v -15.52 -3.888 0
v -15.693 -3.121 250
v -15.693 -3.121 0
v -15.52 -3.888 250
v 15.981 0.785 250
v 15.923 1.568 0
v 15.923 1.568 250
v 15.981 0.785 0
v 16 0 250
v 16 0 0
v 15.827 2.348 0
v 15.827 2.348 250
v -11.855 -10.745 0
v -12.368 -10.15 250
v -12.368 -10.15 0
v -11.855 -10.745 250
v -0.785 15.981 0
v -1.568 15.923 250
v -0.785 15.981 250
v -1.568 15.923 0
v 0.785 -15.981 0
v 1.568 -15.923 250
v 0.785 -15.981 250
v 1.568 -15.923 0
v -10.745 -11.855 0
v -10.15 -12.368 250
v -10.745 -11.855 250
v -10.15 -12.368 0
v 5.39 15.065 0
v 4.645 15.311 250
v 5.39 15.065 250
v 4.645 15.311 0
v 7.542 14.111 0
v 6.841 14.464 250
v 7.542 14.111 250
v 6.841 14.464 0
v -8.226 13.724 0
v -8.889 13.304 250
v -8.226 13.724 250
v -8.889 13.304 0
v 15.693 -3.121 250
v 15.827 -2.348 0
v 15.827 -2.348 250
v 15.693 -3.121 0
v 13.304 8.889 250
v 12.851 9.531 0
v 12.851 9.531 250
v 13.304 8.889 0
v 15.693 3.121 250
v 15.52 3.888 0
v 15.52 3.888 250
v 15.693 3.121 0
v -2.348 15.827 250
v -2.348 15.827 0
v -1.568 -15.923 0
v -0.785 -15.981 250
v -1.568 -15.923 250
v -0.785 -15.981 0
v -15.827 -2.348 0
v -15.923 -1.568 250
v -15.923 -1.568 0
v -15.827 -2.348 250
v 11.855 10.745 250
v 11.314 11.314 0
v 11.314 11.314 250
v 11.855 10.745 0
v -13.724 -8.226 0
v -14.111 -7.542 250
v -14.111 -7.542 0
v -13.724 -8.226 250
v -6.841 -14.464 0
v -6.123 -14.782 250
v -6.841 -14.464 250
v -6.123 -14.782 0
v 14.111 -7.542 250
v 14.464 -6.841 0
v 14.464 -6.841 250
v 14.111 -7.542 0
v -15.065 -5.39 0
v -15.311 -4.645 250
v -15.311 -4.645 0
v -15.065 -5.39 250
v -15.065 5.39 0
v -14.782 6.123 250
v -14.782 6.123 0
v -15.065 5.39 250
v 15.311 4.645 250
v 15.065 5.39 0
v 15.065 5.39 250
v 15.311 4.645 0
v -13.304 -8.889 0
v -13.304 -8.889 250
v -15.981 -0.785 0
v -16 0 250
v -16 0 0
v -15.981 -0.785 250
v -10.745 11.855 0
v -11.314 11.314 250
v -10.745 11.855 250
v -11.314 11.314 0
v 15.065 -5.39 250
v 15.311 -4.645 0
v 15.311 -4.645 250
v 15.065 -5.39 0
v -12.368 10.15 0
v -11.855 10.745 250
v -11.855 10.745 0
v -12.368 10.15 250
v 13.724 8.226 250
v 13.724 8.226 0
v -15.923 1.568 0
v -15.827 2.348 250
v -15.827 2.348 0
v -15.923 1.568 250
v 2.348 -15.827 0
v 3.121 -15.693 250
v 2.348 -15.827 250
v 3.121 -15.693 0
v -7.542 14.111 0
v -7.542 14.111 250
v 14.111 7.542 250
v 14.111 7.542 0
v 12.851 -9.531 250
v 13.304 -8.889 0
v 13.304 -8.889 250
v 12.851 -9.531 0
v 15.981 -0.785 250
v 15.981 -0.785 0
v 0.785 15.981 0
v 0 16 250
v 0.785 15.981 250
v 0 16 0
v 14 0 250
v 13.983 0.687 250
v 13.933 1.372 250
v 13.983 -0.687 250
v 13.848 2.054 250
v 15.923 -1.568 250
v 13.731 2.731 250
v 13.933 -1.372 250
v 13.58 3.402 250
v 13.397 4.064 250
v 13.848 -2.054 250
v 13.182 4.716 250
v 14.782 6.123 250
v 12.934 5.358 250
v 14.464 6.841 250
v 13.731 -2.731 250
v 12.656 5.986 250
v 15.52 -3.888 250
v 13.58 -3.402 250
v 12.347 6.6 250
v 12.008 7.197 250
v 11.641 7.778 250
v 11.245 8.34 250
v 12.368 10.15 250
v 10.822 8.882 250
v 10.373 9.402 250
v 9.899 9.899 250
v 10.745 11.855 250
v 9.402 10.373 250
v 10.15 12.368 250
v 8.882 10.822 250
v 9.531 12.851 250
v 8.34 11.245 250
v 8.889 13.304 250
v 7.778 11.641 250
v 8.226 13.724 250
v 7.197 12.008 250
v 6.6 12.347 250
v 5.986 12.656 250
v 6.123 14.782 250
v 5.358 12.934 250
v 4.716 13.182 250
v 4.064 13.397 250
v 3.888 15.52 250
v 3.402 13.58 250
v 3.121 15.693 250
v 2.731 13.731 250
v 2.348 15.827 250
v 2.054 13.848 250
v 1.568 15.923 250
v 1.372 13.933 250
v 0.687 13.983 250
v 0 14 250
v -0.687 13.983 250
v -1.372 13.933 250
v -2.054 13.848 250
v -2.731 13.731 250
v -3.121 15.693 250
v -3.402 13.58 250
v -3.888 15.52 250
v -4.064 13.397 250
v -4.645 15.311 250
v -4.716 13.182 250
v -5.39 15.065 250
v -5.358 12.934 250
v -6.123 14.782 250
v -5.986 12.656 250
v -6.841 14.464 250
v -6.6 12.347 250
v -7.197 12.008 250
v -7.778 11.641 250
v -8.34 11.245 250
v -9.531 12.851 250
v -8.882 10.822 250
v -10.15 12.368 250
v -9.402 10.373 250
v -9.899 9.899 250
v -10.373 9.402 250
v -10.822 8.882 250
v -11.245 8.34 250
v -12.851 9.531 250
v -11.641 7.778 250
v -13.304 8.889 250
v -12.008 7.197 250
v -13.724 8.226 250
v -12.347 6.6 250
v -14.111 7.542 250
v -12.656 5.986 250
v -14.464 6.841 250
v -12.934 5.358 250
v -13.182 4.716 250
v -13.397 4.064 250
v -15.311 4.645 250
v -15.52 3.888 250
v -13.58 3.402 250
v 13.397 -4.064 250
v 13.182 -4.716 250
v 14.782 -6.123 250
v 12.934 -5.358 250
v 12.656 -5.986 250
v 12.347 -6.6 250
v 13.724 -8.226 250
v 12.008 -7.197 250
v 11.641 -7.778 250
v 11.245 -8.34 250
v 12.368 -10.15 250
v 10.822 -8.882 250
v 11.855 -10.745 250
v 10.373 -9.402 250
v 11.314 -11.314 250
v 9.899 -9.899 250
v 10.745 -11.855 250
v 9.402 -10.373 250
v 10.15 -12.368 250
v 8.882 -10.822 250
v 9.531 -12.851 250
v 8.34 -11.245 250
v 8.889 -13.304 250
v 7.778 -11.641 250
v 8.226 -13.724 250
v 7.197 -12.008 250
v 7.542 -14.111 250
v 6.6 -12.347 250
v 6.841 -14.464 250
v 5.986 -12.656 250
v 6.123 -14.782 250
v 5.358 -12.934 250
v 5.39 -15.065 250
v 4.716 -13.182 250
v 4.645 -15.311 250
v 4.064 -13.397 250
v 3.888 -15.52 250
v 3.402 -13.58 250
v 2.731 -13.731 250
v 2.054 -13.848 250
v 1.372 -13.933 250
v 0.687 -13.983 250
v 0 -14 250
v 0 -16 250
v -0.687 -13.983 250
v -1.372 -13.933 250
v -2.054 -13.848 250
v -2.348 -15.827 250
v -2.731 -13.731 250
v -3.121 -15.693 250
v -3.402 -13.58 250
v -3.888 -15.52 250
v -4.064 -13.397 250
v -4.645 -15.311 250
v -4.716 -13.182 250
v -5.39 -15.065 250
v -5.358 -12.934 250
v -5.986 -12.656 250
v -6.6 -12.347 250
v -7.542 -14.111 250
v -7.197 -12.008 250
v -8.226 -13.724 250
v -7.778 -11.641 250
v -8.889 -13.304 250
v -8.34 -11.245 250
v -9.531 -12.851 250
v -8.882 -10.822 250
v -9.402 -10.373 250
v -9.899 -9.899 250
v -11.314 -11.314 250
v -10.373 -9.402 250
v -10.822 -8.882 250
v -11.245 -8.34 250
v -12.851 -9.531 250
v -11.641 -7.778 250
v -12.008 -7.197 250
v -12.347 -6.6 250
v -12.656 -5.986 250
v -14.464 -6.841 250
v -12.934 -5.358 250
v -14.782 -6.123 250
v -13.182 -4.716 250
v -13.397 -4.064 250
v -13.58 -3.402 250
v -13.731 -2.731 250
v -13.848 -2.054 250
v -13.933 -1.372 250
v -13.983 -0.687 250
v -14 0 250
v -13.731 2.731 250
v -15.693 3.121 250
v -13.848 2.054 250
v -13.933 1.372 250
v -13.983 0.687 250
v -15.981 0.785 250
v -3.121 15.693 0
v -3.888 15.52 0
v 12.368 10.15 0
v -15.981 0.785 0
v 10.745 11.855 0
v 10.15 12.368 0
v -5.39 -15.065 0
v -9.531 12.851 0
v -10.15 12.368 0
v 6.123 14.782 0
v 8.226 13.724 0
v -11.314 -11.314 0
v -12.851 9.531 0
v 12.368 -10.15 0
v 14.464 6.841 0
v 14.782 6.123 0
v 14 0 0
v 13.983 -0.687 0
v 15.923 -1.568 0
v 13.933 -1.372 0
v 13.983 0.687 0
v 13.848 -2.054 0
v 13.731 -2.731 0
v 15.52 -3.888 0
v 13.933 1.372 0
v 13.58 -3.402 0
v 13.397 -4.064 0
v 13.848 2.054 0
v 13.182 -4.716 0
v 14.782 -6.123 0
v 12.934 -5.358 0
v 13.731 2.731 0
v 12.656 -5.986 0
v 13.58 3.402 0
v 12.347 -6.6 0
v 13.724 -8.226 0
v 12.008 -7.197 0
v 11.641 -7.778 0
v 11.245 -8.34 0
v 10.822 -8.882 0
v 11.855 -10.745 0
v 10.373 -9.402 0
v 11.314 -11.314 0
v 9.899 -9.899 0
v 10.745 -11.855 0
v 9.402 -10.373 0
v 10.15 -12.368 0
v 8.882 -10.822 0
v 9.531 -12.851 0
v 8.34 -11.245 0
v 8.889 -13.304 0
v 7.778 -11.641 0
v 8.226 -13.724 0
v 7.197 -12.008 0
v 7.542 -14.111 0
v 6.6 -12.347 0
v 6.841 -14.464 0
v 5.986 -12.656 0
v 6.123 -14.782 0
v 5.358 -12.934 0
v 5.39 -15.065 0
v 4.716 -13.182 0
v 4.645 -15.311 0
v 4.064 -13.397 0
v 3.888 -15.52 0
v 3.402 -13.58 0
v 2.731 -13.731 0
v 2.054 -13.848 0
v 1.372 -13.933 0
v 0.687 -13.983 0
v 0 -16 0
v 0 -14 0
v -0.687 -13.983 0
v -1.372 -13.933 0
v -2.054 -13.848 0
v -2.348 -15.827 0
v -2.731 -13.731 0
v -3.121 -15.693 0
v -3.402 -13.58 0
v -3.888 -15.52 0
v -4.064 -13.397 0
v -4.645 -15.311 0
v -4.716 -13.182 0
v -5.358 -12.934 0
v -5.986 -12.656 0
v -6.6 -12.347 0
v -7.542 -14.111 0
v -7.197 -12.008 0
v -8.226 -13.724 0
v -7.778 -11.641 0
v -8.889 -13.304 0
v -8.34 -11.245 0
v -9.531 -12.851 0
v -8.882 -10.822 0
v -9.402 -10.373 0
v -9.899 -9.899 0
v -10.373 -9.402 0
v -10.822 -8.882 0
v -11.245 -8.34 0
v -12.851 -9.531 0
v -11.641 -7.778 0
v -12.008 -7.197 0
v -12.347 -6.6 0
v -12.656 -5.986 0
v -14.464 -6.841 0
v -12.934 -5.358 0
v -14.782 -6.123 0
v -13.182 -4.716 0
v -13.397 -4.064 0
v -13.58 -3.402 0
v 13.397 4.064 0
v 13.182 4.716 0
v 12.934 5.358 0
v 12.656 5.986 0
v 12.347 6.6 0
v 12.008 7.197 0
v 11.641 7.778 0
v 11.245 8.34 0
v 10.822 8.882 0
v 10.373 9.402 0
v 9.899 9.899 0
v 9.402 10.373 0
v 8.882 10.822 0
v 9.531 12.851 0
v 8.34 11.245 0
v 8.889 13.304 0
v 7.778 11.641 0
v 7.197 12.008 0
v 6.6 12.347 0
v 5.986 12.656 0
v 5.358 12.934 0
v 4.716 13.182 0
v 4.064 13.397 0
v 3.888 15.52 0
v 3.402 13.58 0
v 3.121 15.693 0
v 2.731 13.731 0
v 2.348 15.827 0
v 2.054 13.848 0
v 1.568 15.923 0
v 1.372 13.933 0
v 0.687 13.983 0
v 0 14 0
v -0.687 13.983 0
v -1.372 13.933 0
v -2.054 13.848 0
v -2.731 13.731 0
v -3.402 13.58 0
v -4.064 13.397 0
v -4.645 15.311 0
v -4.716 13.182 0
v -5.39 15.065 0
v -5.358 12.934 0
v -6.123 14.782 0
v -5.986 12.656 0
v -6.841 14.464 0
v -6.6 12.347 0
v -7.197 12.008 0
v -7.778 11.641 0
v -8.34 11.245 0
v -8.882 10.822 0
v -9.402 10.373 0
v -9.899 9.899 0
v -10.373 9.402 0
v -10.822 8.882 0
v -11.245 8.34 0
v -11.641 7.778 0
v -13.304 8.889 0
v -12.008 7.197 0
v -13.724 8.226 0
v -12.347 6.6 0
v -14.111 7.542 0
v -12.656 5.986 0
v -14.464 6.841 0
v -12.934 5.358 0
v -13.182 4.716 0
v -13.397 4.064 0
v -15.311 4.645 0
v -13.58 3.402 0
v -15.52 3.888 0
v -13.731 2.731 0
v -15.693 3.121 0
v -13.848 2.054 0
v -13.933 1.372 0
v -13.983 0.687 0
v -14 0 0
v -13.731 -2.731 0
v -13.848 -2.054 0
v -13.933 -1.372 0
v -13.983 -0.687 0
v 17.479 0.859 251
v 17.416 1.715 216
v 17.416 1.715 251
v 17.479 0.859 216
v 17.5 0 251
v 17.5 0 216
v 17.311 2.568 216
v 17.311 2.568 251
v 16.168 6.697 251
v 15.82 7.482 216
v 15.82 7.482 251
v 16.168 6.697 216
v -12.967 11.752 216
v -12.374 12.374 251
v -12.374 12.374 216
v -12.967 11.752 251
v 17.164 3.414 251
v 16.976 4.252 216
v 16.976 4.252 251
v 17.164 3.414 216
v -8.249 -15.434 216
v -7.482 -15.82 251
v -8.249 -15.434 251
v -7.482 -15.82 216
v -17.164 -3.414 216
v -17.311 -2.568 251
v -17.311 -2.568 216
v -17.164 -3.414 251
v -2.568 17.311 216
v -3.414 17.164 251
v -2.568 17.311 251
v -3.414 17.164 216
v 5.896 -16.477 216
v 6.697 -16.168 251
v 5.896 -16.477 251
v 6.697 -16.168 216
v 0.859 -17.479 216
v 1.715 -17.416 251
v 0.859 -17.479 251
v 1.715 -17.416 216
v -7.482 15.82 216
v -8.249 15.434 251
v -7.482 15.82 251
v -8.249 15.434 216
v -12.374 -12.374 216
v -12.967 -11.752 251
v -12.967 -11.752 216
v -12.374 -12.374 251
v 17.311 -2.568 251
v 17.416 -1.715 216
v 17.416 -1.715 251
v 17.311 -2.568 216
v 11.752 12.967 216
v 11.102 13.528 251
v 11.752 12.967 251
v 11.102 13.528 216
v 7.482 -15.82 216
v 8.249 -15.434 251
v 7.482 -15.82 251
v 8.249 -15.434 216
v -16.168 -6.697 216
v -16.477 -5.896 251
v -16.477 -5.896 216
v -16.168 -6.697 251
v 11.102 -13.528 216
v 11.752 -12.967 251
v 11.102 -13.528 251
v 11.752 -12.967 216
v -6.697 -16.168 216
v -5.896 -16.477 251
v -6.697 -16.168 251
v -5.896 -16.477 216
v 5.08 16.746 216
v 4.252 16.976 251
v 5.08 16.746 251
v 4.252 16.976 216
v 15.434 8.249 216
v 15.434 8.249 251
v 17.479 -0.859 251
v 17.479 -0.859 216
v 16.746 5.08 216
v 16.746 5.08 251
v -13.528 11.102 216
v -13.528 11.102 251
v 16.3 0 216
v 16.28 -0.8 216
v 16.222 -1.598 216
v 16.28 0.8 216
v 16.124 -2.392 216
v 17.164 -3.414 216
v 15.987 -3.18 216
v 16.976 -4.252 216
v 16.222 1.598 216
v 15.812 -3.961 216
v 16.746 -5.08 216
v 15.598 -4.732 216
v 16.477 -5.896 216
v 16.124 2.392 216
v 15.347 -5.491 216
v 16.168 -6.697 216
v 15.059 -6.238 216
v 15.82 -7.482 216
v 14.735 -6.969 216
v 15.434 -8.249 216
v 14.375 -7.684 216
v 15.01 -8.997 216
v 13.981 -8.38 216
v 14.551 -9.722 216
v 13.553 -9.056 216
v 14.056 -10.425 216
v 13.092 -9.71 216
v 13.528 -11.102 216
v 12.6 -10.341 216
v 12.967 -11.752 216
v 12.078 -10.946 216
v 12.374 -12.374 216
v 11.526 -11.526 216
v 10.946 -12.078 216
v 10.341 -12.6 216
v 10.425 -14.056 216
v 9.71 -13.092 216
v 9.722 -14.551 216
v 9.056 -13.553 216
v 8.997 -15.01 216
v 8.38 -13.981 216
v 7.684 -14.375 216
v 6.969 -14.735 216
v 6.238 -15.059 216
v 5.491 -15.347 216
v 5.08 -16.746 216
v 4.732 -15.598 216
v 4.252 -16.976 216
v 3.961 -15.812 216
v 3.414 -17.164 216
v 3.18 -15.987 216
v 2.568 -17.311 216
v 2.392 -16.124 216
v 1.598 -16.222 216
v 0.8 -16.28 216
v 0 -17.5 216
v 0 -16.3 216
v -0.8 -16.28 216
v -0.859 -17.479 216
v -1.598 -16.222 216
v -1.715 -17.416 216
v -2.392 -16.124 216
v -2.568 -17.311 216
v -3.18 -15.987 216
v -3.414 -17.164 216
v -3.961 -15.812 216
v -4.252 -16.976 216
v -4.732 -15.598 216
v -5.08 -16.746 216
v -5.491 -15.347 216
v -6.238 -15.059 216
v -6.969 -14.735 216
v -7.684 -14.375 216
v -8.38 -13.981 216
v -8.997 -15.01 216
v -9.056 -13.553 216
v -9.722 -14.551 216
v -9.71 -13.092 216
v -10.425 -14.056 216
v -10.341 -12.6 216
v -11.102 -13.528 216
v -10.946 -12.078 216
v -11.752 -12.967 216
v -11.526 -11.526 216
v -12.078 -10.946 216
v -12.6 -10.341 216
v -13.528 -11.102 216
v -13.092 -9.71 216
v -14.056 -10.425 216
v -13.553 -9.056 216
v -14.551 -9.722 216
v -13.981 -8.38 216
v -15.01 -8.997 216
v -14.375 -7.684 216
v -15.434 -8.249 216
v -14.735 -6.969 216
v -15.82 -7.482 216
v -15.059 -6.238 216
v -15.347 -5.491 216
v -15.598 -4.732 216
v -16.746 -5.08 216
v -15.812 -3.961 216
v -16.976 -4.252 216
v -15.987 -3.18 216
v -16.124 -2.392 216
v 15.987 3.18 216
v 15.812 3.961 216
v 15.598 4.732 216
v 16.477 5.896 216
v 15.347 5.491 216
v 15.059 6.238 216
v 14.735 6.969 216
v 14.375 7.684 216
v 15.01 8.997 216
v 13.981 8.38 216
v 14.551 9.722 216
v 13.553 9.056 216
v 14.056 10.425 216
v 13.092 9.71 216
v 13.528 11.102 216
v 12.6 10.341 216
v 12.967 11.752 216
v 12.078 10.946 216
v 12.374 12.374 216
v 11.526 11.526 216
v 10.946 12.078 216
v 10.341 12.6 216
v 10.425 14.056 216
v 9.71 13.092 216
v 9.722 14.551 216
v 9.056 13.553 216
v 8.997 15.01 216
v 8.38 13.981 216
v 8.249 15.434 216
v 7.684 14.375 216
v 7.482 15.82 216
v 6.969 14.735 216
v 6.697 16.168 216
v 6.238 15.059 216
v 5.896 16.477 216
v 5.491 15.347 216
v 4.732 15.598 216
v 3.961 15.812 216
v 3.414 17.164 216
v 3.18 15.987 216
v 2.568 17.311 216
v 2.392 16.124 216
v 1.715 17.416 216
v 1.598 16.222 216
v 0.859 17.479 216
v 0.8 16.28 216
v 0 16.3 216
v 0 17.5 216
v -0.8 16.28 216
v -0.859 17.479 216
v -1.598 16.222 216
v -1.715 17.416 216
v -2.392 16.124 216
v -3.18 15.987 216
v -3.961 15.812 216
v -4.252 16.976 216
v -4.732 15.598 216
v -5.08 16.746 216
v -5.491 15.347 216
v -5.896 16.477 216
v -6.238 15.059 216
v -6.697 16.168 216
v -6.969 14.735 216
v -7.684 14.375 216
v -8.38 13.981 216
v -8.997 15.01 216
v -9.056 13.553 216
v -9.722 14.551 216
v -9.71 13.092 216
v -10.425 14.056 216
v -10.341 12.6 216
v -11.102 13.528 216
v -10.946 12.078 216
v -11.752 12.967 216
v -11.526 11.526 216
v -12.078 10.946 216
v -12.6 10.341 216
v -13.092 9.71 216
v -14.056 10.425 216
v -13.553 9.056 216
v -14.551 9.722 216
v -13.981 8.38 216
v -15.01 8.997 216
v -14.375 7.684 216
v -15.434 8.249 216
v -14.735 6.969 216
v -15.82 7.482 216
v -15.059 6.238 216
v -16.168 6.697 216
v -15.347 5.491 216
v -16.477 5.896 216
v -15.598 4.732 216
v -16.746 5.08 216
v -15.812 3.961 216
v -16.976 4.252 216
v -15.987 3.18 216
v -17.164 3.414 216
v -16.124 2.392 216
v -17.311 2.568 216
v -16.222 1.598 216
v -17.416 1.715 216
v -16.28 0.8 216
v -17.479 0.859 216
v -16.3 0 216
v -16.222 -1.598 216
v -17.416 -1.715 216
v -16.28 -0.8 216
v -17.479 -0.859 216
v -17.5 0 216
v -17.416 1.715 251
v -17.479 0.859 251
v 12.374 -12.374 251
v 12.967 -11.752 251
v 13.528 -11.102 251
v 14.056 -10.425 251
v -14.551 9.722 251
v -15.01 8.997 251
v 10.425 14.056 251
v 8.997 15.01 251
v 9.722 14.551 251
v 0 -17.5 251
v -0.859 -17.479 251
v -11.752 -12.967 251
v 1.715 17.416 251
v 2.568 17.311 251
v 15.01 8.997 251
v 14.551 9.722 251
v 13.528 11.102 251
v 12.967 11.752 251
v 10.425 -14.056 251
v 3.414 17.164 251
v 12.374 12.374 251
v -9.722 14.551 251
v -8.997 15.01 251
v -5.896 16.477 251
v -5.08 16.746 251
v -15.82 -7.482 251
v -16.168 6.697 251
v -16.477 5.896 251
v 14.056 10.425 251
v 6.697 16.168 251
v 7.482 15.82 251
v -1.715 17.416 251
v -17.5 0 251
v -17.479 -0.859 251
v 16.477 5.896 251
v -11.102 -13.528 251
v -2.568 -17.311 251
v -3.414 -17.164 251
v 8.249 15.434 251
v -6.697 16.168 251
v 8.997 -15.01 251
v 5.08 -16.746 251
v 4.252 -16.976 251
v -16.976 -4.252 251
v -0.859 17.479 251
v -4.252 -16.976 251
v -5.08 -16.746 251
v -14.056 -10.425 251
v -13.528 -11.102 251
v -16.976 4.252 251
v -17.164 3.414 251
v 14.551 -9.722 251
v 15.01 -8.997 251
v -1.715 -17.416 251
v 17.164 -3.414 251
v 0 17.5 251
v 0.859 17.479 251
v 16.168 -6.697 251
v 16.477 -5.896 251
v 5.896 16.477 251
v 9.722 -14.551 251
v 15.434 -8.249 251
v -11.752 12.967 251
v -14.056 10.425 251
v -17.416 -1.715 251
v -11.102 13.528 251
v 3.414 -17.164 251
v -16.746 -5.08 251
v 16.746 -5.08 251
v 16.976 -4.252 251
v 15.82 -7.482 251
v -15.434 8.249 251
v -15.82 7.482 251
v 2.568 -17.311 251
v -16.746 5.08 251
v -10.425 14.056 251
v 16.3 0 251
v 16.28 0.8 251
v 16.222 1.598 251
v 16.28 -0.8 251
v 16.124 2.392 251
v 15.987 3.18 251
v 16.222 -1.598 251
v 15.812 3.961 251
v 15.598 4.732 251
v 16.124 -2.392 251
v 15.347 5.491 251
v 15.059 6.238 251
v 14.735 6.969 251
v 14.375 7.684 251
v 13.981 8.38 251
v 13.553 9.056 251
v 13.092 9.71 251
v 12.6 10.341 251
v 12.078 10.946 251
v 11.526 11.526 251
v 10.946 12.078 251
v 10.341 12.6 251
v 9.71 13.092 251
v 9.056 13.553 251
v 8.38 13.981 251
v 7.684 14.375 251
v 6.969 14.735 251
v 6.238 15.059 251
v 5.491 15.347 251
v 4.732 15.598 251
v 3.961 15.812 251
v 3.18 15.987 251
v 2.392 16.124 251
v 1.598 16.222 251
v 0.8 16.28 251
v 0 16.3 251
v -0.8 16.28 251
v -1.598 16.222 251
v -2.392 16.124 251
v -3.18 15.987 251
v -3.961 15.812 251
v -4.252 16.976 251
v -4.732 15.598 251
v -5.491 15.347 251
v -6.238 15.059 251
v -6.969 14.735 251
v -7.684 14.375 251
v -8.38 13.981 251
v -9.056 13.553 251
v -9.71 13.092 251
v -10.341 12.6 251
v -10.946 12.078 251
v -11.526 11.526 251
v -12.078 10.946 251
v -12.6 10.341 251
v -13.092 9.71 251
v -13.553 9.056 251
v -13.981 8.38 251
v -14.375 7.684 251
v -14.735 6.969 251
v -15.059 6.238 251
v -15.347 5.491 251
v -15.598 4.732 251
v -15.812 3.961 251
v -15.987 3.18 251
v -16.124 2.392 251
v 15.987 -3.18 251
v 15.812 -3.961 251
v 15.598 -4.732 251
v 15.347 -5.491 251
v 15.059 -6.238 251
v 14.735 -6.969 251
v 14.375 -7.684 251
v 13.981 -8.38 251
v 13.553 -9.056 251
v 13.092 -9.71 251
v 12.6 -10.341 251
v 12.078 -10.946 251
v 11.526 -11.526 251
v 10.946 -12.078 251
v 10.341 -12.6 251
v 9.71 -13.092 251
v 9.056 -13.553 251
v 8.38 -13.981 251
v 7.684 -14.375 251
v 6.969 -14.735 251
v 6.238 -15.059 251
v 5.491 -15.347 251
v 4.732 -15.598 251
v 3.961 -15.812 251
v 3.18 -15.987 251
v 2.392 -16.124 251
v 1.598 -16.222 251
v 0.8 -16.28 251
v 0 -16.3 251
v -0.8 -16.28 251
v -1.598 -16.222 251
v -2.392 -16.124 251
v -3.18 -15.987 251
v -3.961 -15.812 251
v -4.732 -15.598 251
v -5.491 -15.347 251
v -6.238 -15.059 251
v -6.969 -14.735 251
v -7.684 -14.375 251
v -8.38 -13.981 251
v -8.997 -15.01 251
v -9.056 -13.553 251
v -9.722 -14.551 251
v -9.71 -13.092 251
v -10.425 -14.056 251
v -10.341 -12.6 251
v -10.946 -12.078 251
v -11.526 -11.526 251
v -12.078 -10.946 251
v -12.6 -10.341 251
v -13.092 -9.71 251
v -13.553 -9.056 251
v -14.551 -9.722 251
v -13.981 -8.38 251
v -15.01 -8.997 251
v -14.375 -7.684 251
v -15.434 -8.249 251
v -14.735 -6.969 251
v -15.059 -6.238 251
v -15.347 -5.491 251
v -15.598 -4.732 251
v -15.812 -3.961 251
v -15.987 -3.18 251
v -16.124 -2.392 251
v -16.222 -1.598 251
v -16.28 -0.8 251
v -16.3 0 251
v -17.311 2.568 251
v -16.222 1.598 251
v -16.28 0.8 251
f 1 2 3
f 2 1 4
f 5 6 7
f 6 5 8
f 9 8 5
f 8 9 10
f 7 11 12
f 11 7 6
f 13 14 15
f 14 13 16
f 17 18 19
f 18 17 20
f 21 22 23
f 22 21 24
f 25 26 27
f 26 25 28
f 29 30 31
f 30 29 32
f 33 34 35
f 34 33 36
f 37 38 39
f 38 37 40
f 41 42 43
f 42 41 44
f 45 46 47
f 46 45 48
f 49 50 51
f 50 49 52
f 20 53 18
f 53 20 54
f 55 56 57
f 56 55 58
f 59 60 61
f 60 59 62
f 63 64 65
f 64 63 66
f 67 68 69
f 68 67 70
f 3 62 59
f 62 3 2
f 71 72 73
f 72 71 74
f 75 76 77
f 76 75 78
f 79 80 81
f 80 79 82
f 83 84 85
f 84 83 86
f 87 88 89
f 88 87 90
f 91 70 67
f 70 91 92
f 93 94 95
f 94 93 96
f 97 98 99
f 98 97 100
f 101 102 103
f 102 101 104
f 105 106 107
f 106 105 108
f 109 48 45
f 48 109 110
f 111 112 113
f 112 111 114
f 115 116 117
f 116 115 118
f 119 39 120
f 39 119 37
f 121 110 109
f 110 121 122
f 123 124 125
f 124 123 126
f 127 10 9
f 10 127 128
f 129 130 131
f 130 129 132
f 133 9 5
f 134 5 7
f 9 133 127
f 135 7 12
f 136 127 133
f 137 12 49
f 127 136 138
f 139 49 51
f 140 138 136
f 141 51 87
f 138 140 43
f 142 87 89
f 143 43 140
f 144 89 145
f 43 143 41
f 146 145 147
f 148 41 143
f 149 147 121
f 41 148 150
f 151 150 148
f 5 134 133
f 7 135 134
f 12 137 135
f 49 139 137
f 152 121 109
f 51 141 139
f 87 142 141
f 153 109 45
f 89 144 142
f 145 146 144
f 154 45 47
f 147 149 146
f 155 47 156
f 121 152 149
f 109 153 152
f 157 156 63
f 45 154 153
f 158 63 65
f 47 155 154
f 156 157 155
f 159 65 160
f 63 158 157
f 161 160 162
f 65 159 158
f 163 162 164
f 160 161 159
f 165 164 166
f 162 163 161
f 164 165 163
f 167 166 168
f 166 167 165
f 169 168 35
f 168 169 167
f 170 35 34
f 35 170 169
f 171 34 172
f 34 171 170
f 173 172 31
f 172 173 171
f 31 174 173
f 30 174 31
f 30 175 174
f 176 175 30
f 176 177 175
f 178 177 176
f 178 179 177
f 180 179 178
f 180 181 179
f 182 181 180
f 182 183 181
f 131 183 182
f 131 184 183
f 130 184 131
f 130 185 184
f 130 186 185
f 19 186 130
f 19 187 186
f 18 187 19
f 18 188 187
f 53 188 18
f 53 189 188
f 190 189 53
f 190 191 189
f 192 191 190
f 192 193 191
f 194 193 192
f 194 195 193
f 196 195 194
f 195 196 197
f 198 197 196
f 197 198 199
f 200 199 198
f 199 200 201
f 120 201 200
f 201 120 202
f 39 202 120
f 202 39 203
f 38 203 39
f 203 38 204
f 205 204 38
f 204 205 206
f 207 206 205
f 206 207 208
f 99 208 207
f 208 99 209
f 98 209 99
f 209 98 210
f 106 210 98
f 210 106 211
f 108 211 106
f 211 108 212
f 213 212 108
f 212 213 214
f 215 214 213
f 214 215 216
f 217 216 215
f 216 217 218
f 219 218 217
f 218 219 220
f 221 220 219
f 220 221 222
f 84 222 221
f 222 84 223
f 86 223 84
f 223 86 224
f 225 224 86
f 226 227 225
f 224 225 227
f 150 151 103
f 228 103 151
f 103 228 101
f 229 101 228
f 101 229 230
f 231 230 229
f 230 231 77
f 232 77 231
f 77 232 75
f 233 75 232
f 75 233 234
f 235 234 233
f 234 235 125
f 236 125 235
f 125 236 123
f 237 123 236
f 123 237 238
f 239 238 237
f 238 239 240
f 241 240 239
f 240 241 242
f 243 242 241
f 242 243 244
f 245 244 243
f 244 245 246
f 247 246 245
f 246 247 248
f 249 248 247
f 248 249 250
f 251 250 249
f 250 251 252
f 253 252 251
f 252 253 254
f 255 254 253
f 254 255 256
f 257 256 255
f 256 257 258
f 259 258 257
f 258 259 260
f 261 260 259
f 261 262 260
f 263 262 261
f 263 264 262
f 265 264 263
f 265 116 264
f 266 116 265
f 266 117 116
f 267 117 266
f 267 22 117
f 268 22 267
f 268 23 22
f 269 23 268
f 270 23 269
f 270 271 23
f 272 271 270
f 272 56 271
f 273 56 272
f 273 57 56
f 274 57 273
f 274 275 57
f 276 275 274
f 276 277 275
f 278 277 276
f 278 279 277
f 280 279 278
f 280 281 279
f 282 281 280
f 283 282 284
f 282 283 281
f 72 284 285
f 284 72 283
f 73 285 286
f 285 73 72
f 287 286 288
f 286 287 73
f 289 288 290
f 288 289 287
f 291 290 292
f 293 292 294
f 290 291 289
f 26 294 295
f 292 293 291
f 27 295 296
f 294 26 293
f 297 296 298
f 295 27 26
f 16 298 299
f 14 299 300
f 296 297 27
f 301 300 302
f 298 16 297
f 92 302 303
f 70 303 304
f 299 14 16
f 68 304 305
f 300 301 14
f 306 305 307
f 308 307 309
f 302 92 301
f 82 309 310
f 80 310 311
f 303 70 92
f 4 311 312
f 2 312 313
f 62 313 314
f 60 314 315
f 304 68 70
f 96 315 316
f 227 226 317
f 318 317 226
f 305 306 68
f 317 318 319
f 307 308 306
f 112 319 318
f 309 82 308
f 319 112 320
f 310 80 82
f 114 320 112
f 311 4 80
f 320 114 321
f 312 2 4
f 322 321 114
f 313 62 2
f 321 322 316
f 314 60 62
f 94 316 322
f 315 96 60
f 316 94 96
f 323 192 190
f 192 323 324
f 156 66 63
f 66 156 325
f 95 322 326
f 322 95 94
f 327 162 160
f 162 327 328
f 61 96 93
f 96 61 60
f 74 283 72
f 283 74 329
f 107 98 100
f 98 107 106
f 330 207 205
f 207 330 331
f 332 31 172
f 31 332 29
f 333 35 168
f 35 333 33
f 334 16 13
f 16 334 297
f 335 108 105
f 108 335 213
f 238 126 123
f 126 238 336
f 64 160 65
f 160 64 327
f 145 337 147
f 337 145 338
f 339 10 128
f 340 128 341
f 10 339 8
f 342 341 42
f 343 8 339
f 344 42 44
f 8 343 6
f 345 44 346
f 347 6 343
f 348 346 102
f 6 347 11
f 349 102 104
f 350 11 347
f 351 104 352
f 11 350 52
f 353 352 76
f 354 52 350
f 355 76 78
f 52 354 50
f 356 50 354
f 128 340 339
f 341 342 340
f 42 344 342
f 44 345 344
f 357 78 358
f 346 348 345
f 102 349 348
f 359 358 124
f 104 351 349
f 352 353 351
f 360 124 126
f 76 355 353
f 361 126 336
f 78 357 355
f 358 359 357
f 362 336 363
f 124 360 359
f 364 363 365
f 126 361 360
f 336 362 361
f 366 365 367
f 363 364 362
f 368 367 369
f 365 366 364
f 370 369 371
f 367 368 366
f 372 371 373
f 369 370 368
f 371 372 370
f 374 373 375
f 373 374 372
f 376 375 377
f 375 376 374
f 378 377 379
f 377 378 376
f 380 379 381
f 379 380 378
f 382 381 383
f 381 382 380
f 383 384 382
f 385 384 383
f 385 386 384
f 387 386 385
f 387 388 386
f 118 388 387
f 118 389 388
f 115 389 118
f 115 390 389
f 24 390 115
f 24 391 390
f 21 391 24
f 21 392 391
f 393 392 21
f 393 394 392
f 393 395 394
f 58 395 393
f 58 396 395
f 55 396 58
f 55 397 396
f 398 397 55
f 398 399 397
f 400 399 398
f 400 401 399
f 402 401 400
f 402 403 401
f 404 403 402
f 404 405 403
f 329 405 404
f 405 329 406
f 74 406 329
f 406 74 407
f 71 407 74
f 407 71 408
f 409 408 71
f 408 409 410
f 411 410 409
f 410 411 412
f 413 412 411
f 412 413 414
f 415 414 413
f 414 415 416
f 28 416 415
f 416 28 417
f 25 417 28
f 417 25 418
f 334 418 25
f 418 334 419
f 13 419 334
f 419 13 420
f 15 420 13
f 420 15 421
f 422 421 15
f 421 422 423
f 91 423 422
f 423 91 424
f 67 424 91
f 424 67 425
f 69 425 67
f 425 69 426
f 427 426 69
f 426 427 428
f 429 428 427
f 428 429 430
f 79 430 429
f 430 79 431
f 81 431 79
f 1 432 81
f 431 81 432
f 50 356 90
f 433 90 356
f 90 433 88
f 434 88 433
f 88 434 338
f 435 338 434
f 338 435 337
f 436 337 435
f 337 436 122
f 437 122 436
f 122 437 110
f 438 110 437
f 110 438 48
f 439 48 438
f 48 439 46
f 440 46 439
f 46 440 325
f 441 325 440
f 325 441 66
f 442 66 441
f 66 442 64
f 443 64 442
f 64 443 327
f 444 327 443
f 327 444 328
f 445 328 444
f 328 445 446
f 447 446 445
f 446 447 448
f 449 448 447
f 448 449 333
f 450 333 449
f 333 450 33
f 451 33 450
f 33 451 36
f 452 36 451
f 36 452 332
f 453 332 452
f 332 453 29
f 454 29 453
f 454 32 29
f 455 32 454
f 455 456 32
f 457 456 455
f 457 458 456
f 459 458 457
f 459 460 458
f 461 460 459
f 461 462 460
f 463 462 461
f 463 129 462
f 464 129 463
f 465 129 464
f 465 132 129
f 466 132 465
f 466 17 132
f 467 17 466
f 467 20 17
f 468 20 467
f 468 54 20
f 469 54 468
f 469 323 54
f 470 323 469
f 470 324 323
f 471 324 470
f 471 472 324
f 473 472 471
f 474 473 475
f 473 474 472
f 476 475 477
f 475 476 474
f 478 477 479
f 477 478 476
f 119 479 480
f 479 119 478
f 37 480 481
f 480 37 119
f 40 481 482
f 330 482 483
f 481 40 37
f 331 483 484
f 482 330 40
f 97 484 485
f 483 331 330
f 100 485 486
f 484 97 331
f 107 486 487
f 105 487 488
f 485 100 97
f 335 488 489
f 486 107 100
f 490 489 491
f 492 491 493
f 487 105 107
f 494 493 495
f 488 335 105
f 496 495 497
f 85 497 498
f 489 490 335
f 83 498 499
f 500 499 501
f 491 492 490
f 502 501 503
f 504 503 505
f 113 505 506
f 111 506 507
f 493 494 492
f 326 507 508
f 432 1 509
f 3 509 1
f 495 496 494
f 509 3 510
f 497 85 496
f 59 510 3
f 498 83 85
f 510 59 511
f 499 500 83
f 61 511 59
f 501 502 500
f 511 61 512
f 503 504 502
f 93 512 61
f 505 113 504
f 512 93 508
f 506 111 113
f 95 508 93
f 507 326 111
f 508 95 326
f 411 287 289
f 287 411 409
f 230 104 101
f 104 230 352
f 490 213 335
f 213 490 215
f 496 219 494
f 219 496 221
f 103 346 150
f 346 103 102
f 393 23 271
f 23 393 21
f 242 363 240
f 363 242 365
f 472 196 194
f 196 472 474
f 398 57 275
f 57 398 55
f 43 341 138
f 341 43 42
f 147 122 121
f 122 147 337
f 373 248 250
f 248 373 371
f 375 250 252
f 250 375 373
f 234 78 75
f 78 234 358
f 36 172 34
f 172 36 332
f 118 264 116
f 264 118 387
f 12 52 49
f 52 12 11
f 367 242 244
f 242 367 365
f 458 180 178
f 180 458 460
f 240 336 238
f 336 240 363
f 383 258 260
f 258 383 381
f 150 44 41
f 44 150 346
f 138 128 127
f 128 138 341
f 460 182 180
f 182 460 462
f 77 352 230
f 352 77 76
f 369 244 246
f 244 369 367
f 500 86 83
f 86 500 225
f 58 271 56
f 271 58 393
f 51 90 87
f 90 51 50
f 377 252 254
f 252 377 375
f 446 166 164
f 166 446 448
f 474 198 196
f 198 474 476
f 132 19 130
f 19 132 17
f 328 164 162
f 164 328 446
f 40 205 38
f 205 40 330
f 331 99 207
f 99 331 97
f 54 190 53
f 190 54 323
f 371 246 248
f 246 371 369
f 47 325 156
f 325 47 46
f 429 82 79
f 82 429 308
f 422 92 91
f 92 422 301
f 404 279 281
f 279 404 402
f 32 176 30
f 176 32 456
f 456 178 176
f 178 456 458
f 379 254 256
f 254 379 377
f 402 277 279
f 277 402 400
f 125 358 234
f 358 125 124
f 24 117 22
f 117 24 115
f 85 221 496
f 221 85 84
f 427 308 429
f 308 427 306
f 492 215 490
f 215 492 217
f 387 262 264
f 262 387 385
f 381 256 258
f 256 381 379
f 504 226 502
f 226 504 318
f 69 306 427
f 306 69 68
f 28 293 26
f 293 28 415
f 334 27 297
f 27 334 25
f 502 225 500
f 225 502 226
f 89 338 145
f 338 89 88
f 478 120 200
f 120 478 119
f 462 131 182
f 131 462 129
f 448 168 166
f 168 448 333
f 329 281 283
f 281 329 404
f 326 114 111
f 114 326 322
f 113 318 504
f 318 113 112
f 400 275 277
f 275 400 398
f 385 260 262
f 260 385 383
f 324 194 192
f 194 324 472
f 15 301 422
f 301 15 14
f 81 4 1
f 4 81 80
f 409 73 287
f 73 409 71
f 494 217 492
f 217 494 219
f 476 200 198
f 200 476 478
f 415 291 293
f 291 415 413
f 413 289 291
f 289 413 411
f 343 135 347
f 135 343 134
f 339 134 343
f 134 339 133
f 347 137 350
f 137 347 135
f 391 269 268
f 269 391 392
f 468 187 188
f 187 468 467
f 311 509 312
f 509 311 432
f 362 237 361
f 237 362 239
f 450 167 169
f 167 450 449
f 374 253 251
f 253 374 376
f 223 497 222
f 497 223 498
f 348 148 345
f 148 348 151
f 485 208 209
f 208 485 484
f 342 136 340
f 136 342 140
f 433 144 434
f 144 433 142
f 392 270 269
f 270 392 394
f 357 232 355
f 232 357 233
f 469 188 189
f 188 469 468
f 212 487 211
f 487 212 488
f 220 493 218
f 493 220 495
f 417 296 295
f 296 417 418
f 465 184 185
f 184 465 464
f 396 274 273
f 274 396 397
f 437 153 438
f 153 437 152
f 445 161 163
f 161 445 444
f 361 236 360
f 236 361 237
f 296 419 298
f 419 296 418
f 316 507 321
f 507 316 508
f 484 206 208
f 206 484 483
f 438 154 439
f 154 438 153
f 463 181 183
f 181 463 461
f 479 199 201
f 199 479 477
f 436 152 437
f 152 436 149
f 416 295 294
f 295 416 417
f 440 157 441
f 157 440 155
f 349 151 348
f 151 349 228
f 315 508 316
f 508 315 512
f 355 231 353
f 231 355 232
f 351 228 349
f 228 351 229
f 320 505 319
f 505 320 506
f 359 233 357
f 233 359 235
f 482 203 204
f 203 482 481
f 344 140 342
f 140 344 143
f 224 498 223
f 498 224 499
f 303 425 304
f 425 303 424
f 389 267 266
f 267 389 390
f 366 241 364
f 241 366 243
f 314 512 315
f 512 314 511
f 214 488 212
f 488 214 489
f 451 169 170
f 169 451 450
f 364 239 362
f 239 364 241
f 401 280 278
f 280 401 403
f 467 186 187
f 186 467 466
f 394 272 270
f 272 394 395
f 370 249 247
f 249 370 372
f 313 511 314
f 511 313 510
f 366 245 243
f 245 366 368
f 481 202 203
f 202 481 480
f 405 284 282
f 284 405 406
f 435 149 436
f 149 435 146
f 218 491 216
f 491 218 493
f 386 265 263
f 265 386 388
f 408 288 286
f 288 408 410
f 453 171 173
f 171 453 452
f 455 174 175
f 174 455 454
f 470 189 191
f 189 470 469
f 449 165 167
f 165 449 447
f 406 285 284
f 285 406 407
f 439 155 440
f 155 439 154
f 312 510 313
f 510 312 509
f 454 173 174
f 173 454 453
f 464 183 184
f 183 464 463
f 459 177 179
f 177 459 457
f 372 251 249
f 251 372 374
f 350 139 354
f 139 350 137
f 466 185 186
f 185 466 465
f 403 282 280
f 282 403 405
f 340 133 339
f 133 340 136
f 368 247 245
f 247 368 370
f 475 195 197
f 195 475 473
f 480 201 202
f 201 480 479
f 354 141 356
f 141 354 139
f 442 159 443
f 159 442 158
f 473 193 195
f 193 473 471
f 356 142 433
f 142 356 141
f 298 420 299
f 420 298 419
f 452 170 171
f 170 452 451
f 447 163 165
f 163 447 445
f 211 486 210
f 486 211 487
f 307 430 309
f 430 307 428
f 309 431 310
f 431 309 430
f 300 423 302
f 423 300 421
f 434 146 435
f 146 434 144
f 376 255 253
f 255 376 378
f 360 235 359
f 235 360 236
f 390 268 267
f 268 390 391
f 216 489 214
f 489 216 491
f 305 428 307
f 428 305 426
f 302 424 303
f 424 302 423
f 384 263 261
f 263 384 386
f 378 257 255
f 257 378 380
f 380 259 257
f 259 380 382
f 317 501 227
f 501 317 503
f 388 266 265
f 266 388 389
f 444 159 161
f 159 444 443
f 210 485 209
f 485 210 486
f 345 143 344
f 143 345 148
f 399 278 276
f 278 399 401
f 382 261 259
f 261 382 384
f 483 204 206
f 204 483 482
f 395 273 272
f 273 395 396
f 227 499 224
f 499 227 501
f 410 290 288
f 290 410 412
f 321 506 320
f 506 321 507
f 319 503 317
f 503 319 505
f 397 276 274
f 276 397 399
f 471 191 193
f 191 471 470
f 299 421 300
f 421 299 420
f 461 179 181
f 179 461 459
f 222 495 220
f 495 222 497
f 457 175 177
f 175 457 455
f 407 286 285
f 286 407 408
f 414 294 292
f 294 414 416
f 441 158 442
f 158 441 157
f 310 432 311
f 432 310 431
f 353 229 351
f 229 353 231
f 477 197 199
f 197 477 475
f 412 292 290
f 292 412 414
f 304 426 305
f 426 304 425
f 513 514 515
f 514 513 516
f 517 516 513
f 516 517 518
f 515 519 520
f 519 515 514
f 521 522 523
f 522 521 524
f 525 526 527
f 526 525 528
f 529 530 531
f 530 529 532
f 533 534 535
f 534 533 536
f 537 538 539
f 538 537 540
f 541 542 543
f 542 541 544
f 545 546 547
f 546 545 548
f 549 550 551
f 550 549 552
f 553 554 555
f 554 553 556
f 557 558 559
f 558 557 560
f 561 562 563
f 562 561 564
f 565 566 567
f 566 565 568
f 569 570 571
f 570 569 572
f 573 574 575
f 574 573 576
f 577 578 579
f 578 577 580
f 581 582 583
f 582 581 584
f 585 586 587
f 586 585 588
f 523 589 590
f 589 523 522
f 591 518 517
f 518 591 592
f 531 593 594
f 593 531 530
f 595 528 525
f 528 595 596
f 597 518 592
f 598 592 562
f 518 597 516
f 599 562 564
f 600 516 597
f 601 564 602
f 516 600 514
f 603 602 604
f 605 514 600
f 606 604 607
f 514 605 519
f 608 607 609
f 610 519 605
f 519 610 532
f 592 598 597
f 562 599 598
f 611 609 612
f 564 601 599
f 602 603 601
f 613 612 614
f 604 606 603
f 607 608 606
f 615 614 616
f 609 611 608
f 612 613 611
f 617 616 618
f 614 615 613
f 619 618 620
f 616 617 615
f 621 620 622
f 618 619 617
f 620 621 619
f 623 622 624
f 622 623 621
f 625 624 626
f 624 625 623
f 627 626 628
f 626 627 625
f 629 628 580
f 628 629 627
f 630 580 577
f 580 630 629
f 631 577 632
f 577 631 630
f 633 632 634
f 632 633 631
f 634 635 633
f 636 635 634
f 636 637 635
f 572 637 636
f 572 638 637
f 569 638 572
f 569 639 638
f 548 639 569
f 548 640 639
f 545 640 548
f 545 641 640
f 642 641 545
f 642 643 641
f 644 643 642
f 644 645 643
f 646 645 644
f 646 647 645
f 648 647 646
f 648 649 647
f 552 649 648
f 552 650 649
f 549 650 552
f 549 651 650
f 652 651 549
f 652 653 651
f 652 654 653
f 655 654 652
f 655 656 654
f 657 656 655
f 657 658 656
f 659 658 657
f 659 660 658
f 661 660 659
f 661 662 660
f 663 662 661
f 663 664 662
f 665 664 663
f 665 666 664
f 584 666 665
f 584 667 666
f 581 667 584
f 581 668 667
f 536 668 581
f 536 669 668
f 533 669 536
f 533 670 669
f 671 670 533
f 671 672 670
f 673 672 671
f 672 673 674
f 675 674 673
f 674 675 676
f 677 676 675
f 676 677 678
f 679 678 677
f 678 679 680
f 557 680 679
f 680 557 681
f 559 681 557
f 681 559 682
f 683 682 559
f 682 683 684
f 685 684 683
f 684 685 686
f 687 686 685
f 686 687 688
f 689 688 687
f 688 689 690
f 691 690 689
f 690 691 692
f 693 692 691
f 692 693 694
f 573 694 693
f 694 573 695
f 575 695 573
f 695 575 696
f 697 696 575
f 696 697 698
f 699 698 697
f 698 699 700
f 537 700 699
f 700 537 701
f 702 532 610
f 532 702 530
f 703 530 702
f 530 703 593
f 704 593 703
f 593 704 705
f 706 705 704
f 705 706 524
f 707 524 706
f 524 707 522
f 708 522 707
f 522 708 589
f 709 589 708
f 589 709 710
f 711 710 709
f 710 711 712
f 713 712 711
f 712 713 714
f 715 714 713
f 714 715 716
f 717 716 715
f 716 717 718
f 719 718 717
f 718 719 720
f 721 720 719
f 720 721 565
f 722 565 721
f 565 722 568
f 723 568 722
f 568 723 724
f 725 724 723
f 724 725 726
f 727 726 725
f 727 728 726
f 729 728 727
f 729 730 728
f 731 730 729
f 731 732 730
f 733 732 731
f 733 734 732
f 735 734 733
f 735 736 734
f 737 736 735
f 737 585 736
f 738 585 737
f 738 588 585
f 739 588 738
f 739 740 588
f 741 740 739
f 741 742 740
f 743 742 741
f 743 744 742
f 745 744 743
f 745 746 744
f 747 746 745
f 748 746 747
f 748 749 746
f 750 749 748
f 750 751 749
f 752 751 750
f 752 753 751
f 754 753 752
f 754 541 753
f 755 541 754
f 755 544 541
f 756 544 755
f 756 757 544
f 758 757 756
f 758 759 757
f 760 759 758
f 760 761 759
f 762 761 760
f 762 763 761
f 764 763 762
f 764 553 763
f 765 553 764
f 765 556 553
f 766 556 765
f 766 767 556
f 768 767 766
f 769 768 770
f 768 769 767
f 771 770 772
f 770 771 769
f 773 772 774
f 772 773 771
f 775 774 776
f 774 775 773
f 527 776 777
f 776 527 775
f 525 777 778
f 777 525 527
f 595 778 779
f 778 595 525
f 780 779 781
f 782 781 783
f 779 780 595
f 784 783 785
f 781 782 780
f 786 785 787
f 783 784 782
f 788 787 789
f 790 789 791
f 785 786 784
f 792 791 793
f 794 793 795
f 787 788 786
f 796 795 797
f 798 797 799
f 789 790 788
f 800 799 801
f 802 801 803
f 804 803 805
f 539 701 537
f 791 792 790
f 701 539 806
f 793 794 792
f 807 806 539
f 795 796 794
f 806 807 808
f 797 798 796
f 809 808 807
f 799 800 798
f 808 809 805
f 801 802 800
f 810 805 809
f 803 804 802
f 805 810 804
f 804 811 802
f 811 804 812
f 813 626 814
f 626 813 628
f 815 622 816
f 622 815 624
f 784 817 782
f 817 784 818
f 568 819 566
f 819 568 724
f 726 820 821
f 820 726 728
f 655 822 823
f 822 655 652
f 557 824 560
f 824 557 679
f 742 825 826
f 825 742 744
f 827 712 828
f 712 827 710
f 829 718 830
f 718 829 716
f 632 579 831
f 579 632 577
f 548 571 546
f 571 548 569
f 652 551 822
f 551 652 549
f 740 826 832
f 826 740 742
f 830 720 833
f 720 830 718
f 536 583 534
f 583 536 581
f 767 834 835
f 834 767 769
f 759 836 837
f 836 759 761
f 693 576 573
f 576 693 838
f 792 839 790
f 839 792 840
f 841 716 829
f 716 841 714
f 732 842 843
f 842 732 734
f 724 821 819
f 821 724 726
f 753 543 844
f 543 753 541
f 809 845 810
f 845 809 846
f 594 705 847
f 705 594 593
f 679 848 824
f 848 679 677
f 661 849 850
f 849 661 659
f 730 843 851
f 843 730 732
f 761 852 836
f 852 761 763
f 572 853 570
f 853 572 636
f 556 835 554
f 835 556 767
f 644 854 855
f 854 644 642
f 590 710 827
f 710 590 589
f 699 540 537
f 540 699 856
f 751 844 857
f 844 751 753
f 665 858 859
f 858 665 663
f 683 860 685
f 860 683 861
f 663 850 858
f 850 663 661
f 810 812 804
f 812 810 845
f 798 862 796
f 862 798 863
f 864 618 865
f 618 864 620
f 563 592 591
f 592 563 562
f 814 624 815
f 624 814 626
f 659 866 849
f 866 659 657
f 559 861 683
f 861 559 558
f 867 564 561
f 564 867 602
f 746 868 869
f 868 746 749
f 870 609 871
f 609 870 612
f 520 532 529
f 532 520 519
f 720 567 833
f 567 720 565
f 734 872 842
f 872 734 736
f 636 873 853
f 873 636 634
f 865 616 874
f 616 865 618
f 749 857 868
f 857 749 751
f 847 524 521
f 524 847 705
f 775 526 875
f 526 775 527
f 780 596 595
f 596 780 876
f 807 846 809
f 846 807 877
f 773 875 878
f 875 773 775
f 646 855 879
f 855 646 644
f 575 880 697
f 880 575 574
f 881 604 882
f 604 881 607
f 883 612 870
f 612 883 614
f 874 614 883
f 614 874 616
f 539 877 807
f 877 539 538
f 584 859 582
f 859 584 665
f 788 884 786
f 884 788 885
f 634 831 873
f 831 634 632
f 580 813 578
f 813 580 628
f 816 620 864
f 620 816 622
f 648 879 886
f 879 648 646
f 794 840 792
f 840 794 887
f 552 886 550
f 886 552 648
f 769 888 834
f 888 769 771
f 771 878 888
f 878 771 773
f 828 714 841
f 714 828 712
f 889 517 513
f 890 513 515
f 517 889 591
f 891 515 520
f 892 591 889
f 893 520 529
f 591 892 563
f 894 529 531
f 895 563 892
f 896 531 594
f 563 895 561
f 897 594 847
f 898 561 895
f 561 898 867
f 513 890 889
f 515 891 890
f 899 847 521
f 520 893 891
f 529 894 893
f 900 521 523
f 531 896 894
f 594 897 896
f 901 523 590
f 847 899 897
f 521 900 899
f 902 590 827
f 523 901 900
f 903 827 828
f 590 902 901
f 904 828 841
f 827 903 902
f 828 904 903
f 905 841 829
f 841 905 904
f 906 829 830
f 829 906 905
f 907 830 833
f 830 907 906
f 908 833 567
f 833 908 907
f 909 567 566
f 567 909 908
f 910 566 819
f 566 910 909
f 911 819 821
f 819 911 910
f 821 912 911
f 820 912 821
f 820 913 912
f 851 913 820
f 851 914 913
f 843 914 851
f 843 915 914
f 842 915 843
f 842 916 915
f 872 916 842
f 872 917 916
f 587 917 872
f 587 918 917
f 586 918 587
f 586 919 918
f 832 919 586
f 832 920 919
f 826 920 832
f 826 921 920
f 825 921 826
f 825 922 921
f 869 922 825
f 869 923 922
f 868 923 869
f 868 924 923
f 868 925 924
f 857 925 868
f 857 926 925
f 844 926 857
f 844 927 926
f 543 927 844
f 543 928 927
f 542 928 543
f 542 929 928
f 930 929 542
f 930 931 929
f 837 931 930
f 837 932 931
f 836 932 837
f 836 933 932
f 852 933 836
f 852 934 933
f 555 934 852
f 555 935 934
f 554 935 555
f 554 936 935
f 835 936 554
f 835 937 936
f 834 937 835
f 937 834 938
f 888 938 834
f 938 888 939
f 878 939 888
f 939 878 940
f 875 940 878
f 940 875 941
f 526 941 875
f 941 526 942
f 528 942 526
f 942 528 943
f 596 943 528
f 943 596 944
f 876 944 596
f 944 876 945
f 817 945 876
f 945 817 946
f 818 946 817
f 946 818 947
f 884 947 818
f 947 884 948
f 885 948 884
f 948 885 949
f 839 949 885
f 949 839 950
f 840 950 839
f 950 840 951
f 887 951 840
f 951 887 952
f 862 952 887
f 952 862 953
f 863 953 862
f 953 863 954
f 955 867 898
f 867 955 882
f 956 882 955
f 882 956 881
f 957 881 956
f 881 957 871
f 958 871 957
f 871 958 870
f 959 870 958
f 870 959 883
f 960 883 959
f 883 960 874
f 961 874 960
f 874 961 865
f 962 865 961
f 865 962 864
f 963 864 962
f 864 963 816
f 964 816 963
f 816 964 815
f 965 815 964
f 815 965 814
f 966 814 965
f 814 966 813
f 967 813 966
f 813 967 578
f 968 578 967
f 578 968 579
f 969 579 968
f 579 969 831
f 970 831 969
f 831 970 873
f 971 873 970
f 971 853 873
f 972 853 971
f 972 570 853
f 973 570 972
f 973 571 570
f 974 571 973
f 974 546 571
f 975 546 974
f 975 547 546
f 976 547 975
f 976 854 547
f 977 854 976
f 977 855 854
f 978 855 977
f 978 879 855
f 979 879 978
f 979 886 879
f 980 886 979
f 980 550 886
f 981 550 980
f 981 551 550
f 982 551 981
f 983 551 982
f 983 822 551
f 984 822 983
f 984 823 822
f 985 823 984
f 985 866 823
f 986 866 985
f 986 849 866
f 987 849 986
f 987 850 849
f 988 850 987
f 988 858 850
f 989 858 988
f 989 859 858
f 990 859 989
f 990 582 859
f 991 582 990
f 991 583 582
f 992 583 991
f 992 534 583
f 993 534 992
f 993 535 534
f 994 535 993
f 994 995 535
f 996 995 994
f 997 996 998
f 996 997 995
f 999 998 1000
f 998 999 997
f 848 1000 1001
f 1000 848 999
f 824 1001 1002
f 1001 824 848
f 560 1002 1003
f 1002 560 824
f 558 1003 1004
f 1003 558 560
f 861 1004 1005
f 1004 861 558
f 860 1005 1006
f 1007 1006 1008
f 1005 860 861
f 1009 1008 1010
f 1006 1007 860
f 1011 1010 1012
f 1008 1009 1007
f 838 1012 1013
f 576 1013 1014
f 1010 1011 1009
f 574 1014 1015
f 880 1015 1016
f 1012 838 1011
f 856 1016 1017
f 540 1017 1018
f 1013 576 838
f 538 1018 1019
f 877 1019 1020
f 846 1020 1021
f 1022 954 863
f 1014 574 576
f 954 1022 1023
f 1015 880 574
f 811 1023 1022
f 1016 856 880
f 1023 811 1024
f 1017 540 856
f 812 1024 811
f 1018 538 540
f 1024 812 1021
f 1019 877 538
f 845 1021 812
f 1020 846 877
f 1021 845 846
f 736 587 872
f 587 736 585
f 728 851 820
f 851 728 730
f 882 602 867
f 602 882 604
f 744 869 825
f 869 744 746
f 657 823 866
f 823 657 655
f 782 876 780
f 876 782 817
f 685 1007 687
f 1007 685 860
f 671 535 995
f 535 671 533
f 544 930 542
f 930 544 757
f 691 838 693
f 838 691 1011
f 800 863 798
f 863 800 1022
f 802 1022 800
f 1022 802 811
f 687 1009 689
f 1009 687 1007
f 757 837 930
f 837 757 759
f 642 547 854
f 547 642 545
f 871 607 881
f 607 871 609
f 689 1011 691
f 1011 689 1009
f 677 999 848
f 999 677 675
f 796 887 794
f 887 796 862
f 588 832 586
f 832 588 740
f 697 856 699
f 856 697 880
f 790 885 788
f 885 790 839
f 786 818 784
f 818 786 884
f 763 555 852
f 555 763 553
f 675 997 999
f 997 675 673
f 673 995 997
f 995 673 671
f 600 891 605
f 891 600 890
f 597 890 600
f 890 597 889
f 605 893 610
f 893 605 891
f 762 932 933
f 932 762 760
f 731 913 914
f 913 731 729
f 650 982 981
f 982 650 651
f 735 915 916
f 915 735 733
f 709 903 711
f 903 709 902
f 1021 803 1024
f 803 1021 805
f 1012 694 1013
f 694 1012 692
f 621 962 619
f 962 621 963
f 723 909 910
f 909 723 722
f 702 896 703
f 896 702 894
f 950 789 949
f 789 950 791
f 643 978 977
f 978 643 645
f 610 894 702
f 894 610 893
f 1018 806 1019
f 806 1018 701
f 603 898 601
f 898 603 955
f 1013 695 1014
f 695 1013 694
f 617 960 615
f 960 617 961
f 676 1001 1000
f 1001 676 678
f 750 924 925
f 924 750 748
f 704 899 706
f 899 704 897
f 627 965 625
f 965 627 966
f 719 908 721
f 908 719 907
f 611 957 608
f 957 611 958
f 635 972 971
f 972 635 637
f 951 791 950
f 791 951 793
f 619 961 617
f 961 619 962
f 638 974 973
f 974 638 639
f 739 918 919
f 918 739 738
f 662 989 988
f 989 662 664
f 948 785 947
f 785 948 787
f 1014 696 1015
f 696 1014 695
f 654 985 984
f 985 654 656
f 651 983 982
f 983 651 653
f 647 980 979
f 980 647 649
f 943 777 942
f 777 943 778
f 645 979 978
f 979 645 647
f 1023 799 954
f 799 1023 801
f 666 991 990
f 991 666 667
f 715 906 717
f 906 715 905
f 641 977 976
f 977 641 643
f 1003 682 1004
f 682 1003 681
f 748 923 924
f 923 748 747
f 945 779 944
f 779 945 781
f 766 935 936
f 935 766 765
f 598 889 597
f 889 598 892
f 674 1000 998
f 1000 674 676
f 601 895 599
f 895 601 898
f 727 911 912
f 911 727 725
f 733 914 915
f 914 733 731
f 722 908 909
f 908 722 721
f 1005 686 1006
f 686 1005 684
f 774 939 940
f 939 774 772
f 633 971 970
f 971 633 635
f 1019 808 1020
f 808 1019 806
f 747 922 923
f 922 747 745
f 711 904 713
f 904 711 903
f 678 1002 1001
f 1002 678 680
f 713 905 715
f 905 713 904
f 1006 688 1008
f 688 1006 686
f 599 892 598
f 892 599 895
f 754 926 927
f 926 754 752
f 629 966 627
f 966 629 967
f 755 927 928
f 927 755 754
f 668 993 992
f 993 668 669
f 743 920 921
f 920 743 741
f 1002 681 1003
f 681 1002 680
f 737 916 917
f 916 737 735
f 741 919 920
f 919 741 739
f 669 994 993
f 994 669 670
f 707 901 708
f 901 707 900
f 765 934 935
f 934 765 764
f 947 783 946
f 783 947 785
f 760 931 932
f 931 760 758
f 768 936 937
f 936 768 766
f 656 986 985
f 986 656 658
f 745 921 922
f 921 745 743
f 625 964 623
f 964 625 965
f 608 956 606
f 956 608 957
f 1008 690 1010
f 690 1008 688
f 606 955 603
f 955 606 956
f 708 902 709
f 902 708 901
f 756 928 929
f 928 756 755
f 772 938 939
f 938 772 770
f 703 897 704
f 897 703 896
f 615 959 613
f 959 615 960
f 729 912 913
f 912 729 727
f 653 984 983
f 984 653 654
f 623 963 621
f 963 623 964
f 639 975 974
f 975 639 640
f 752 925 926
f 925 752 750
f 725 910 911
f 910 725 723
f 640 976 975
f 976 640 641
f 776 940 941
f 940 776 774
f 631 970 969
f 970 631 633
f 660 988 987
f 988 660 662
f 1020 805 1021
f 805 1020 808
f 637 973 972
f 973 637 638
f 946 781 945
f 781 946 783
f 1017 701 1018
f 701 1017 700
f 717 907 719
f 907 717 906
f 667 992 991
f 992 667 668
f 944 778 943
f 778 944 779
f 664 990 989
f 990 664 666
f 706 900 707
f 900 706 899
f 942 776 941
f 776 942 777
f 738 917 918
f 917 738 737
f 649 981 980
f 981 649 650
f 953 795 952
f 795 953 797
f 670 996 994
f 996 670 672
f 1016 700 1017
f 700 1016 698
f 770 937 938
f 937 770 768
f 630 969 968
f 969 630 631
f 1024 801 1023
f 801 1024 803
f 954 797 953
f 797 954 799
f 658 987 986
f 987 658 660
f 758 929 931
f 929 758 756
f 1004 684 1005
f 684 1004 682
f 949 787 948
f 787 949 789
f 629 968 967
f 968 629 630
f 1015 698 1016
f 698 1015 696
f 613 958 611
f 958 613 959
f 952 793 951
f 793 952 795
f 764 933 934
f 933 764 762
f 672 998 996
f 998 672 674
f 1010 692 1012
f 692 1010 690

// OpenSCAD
$fn = 128;

// Parameters
pipe_standard = 1; //[1:1:1]
nominal_size_mm = 32; //[16:64:1]
length_mm = 250; //[125:500:1]
include_end_fitting = 1; //[0:1:1]
od_mm = 32; //[16:64:0.5]
wall_mm = 2.0; //[1.0:4.0:0.1]
fit_len_mm = 35; //[18:70:1]
fit_wall_extra_mm = 1.5; //[0.5:3.0:0.1]
fit_id_clearance_mm = 0.6; //[0.2:1.5:0.1]
overlap_mm = 1.0; //[0.5:2.0:0.1]

// Robust epsilon to avoid coplanar/zero-thickness artifacts
eps = 0.05;

// Derived
outer_r = od_mm/2;
inner_r = max(0.01, outer_r - wall_mm);

fit_outer_r = outer_r + fit_wall_extra_mm;
// Socket ID slightly larger than pipe OD
fit_inner_r = outer_r + fit_id_clearance_mm/2;

// Pipe segment (hollow tube)
module ht_pipe() {
  difference() {
    cylinder(h=length_mm, r=outer_r, center=false);
    translate([0, 0, -eps])
      cylinder(h=length_mm + 2*eps, r=inner_r, center=false);
  }
}

// End fitting (socket) placed at the end, overlapping into pipe by overlap_mm
module end_fitting() {
  // Start the fitting so it extends beyond the pipe end by overlap_mm (guaranteed union contact)
  z0 = length_mm - fit_len_mm + overlap_mm;

  difference() {
    translate([0, 0, z0])
      cylinder(h=fit_len_mm, r=fit_outer_r, center=false);

    // Inner void through the fitting; extend slightly to avoid coplanar faces
    translate([0, 0, z0 - eps])
      cylinder(h=fit_len_mm + 2*eps, r=fit_inner_r, center=false);
  }
}

// Assembly (one connected solid)
module assembly() {
  union() {
    ht_pipe();
    if (include_end_fitting) end_fitting();
  }
}

assembly();
